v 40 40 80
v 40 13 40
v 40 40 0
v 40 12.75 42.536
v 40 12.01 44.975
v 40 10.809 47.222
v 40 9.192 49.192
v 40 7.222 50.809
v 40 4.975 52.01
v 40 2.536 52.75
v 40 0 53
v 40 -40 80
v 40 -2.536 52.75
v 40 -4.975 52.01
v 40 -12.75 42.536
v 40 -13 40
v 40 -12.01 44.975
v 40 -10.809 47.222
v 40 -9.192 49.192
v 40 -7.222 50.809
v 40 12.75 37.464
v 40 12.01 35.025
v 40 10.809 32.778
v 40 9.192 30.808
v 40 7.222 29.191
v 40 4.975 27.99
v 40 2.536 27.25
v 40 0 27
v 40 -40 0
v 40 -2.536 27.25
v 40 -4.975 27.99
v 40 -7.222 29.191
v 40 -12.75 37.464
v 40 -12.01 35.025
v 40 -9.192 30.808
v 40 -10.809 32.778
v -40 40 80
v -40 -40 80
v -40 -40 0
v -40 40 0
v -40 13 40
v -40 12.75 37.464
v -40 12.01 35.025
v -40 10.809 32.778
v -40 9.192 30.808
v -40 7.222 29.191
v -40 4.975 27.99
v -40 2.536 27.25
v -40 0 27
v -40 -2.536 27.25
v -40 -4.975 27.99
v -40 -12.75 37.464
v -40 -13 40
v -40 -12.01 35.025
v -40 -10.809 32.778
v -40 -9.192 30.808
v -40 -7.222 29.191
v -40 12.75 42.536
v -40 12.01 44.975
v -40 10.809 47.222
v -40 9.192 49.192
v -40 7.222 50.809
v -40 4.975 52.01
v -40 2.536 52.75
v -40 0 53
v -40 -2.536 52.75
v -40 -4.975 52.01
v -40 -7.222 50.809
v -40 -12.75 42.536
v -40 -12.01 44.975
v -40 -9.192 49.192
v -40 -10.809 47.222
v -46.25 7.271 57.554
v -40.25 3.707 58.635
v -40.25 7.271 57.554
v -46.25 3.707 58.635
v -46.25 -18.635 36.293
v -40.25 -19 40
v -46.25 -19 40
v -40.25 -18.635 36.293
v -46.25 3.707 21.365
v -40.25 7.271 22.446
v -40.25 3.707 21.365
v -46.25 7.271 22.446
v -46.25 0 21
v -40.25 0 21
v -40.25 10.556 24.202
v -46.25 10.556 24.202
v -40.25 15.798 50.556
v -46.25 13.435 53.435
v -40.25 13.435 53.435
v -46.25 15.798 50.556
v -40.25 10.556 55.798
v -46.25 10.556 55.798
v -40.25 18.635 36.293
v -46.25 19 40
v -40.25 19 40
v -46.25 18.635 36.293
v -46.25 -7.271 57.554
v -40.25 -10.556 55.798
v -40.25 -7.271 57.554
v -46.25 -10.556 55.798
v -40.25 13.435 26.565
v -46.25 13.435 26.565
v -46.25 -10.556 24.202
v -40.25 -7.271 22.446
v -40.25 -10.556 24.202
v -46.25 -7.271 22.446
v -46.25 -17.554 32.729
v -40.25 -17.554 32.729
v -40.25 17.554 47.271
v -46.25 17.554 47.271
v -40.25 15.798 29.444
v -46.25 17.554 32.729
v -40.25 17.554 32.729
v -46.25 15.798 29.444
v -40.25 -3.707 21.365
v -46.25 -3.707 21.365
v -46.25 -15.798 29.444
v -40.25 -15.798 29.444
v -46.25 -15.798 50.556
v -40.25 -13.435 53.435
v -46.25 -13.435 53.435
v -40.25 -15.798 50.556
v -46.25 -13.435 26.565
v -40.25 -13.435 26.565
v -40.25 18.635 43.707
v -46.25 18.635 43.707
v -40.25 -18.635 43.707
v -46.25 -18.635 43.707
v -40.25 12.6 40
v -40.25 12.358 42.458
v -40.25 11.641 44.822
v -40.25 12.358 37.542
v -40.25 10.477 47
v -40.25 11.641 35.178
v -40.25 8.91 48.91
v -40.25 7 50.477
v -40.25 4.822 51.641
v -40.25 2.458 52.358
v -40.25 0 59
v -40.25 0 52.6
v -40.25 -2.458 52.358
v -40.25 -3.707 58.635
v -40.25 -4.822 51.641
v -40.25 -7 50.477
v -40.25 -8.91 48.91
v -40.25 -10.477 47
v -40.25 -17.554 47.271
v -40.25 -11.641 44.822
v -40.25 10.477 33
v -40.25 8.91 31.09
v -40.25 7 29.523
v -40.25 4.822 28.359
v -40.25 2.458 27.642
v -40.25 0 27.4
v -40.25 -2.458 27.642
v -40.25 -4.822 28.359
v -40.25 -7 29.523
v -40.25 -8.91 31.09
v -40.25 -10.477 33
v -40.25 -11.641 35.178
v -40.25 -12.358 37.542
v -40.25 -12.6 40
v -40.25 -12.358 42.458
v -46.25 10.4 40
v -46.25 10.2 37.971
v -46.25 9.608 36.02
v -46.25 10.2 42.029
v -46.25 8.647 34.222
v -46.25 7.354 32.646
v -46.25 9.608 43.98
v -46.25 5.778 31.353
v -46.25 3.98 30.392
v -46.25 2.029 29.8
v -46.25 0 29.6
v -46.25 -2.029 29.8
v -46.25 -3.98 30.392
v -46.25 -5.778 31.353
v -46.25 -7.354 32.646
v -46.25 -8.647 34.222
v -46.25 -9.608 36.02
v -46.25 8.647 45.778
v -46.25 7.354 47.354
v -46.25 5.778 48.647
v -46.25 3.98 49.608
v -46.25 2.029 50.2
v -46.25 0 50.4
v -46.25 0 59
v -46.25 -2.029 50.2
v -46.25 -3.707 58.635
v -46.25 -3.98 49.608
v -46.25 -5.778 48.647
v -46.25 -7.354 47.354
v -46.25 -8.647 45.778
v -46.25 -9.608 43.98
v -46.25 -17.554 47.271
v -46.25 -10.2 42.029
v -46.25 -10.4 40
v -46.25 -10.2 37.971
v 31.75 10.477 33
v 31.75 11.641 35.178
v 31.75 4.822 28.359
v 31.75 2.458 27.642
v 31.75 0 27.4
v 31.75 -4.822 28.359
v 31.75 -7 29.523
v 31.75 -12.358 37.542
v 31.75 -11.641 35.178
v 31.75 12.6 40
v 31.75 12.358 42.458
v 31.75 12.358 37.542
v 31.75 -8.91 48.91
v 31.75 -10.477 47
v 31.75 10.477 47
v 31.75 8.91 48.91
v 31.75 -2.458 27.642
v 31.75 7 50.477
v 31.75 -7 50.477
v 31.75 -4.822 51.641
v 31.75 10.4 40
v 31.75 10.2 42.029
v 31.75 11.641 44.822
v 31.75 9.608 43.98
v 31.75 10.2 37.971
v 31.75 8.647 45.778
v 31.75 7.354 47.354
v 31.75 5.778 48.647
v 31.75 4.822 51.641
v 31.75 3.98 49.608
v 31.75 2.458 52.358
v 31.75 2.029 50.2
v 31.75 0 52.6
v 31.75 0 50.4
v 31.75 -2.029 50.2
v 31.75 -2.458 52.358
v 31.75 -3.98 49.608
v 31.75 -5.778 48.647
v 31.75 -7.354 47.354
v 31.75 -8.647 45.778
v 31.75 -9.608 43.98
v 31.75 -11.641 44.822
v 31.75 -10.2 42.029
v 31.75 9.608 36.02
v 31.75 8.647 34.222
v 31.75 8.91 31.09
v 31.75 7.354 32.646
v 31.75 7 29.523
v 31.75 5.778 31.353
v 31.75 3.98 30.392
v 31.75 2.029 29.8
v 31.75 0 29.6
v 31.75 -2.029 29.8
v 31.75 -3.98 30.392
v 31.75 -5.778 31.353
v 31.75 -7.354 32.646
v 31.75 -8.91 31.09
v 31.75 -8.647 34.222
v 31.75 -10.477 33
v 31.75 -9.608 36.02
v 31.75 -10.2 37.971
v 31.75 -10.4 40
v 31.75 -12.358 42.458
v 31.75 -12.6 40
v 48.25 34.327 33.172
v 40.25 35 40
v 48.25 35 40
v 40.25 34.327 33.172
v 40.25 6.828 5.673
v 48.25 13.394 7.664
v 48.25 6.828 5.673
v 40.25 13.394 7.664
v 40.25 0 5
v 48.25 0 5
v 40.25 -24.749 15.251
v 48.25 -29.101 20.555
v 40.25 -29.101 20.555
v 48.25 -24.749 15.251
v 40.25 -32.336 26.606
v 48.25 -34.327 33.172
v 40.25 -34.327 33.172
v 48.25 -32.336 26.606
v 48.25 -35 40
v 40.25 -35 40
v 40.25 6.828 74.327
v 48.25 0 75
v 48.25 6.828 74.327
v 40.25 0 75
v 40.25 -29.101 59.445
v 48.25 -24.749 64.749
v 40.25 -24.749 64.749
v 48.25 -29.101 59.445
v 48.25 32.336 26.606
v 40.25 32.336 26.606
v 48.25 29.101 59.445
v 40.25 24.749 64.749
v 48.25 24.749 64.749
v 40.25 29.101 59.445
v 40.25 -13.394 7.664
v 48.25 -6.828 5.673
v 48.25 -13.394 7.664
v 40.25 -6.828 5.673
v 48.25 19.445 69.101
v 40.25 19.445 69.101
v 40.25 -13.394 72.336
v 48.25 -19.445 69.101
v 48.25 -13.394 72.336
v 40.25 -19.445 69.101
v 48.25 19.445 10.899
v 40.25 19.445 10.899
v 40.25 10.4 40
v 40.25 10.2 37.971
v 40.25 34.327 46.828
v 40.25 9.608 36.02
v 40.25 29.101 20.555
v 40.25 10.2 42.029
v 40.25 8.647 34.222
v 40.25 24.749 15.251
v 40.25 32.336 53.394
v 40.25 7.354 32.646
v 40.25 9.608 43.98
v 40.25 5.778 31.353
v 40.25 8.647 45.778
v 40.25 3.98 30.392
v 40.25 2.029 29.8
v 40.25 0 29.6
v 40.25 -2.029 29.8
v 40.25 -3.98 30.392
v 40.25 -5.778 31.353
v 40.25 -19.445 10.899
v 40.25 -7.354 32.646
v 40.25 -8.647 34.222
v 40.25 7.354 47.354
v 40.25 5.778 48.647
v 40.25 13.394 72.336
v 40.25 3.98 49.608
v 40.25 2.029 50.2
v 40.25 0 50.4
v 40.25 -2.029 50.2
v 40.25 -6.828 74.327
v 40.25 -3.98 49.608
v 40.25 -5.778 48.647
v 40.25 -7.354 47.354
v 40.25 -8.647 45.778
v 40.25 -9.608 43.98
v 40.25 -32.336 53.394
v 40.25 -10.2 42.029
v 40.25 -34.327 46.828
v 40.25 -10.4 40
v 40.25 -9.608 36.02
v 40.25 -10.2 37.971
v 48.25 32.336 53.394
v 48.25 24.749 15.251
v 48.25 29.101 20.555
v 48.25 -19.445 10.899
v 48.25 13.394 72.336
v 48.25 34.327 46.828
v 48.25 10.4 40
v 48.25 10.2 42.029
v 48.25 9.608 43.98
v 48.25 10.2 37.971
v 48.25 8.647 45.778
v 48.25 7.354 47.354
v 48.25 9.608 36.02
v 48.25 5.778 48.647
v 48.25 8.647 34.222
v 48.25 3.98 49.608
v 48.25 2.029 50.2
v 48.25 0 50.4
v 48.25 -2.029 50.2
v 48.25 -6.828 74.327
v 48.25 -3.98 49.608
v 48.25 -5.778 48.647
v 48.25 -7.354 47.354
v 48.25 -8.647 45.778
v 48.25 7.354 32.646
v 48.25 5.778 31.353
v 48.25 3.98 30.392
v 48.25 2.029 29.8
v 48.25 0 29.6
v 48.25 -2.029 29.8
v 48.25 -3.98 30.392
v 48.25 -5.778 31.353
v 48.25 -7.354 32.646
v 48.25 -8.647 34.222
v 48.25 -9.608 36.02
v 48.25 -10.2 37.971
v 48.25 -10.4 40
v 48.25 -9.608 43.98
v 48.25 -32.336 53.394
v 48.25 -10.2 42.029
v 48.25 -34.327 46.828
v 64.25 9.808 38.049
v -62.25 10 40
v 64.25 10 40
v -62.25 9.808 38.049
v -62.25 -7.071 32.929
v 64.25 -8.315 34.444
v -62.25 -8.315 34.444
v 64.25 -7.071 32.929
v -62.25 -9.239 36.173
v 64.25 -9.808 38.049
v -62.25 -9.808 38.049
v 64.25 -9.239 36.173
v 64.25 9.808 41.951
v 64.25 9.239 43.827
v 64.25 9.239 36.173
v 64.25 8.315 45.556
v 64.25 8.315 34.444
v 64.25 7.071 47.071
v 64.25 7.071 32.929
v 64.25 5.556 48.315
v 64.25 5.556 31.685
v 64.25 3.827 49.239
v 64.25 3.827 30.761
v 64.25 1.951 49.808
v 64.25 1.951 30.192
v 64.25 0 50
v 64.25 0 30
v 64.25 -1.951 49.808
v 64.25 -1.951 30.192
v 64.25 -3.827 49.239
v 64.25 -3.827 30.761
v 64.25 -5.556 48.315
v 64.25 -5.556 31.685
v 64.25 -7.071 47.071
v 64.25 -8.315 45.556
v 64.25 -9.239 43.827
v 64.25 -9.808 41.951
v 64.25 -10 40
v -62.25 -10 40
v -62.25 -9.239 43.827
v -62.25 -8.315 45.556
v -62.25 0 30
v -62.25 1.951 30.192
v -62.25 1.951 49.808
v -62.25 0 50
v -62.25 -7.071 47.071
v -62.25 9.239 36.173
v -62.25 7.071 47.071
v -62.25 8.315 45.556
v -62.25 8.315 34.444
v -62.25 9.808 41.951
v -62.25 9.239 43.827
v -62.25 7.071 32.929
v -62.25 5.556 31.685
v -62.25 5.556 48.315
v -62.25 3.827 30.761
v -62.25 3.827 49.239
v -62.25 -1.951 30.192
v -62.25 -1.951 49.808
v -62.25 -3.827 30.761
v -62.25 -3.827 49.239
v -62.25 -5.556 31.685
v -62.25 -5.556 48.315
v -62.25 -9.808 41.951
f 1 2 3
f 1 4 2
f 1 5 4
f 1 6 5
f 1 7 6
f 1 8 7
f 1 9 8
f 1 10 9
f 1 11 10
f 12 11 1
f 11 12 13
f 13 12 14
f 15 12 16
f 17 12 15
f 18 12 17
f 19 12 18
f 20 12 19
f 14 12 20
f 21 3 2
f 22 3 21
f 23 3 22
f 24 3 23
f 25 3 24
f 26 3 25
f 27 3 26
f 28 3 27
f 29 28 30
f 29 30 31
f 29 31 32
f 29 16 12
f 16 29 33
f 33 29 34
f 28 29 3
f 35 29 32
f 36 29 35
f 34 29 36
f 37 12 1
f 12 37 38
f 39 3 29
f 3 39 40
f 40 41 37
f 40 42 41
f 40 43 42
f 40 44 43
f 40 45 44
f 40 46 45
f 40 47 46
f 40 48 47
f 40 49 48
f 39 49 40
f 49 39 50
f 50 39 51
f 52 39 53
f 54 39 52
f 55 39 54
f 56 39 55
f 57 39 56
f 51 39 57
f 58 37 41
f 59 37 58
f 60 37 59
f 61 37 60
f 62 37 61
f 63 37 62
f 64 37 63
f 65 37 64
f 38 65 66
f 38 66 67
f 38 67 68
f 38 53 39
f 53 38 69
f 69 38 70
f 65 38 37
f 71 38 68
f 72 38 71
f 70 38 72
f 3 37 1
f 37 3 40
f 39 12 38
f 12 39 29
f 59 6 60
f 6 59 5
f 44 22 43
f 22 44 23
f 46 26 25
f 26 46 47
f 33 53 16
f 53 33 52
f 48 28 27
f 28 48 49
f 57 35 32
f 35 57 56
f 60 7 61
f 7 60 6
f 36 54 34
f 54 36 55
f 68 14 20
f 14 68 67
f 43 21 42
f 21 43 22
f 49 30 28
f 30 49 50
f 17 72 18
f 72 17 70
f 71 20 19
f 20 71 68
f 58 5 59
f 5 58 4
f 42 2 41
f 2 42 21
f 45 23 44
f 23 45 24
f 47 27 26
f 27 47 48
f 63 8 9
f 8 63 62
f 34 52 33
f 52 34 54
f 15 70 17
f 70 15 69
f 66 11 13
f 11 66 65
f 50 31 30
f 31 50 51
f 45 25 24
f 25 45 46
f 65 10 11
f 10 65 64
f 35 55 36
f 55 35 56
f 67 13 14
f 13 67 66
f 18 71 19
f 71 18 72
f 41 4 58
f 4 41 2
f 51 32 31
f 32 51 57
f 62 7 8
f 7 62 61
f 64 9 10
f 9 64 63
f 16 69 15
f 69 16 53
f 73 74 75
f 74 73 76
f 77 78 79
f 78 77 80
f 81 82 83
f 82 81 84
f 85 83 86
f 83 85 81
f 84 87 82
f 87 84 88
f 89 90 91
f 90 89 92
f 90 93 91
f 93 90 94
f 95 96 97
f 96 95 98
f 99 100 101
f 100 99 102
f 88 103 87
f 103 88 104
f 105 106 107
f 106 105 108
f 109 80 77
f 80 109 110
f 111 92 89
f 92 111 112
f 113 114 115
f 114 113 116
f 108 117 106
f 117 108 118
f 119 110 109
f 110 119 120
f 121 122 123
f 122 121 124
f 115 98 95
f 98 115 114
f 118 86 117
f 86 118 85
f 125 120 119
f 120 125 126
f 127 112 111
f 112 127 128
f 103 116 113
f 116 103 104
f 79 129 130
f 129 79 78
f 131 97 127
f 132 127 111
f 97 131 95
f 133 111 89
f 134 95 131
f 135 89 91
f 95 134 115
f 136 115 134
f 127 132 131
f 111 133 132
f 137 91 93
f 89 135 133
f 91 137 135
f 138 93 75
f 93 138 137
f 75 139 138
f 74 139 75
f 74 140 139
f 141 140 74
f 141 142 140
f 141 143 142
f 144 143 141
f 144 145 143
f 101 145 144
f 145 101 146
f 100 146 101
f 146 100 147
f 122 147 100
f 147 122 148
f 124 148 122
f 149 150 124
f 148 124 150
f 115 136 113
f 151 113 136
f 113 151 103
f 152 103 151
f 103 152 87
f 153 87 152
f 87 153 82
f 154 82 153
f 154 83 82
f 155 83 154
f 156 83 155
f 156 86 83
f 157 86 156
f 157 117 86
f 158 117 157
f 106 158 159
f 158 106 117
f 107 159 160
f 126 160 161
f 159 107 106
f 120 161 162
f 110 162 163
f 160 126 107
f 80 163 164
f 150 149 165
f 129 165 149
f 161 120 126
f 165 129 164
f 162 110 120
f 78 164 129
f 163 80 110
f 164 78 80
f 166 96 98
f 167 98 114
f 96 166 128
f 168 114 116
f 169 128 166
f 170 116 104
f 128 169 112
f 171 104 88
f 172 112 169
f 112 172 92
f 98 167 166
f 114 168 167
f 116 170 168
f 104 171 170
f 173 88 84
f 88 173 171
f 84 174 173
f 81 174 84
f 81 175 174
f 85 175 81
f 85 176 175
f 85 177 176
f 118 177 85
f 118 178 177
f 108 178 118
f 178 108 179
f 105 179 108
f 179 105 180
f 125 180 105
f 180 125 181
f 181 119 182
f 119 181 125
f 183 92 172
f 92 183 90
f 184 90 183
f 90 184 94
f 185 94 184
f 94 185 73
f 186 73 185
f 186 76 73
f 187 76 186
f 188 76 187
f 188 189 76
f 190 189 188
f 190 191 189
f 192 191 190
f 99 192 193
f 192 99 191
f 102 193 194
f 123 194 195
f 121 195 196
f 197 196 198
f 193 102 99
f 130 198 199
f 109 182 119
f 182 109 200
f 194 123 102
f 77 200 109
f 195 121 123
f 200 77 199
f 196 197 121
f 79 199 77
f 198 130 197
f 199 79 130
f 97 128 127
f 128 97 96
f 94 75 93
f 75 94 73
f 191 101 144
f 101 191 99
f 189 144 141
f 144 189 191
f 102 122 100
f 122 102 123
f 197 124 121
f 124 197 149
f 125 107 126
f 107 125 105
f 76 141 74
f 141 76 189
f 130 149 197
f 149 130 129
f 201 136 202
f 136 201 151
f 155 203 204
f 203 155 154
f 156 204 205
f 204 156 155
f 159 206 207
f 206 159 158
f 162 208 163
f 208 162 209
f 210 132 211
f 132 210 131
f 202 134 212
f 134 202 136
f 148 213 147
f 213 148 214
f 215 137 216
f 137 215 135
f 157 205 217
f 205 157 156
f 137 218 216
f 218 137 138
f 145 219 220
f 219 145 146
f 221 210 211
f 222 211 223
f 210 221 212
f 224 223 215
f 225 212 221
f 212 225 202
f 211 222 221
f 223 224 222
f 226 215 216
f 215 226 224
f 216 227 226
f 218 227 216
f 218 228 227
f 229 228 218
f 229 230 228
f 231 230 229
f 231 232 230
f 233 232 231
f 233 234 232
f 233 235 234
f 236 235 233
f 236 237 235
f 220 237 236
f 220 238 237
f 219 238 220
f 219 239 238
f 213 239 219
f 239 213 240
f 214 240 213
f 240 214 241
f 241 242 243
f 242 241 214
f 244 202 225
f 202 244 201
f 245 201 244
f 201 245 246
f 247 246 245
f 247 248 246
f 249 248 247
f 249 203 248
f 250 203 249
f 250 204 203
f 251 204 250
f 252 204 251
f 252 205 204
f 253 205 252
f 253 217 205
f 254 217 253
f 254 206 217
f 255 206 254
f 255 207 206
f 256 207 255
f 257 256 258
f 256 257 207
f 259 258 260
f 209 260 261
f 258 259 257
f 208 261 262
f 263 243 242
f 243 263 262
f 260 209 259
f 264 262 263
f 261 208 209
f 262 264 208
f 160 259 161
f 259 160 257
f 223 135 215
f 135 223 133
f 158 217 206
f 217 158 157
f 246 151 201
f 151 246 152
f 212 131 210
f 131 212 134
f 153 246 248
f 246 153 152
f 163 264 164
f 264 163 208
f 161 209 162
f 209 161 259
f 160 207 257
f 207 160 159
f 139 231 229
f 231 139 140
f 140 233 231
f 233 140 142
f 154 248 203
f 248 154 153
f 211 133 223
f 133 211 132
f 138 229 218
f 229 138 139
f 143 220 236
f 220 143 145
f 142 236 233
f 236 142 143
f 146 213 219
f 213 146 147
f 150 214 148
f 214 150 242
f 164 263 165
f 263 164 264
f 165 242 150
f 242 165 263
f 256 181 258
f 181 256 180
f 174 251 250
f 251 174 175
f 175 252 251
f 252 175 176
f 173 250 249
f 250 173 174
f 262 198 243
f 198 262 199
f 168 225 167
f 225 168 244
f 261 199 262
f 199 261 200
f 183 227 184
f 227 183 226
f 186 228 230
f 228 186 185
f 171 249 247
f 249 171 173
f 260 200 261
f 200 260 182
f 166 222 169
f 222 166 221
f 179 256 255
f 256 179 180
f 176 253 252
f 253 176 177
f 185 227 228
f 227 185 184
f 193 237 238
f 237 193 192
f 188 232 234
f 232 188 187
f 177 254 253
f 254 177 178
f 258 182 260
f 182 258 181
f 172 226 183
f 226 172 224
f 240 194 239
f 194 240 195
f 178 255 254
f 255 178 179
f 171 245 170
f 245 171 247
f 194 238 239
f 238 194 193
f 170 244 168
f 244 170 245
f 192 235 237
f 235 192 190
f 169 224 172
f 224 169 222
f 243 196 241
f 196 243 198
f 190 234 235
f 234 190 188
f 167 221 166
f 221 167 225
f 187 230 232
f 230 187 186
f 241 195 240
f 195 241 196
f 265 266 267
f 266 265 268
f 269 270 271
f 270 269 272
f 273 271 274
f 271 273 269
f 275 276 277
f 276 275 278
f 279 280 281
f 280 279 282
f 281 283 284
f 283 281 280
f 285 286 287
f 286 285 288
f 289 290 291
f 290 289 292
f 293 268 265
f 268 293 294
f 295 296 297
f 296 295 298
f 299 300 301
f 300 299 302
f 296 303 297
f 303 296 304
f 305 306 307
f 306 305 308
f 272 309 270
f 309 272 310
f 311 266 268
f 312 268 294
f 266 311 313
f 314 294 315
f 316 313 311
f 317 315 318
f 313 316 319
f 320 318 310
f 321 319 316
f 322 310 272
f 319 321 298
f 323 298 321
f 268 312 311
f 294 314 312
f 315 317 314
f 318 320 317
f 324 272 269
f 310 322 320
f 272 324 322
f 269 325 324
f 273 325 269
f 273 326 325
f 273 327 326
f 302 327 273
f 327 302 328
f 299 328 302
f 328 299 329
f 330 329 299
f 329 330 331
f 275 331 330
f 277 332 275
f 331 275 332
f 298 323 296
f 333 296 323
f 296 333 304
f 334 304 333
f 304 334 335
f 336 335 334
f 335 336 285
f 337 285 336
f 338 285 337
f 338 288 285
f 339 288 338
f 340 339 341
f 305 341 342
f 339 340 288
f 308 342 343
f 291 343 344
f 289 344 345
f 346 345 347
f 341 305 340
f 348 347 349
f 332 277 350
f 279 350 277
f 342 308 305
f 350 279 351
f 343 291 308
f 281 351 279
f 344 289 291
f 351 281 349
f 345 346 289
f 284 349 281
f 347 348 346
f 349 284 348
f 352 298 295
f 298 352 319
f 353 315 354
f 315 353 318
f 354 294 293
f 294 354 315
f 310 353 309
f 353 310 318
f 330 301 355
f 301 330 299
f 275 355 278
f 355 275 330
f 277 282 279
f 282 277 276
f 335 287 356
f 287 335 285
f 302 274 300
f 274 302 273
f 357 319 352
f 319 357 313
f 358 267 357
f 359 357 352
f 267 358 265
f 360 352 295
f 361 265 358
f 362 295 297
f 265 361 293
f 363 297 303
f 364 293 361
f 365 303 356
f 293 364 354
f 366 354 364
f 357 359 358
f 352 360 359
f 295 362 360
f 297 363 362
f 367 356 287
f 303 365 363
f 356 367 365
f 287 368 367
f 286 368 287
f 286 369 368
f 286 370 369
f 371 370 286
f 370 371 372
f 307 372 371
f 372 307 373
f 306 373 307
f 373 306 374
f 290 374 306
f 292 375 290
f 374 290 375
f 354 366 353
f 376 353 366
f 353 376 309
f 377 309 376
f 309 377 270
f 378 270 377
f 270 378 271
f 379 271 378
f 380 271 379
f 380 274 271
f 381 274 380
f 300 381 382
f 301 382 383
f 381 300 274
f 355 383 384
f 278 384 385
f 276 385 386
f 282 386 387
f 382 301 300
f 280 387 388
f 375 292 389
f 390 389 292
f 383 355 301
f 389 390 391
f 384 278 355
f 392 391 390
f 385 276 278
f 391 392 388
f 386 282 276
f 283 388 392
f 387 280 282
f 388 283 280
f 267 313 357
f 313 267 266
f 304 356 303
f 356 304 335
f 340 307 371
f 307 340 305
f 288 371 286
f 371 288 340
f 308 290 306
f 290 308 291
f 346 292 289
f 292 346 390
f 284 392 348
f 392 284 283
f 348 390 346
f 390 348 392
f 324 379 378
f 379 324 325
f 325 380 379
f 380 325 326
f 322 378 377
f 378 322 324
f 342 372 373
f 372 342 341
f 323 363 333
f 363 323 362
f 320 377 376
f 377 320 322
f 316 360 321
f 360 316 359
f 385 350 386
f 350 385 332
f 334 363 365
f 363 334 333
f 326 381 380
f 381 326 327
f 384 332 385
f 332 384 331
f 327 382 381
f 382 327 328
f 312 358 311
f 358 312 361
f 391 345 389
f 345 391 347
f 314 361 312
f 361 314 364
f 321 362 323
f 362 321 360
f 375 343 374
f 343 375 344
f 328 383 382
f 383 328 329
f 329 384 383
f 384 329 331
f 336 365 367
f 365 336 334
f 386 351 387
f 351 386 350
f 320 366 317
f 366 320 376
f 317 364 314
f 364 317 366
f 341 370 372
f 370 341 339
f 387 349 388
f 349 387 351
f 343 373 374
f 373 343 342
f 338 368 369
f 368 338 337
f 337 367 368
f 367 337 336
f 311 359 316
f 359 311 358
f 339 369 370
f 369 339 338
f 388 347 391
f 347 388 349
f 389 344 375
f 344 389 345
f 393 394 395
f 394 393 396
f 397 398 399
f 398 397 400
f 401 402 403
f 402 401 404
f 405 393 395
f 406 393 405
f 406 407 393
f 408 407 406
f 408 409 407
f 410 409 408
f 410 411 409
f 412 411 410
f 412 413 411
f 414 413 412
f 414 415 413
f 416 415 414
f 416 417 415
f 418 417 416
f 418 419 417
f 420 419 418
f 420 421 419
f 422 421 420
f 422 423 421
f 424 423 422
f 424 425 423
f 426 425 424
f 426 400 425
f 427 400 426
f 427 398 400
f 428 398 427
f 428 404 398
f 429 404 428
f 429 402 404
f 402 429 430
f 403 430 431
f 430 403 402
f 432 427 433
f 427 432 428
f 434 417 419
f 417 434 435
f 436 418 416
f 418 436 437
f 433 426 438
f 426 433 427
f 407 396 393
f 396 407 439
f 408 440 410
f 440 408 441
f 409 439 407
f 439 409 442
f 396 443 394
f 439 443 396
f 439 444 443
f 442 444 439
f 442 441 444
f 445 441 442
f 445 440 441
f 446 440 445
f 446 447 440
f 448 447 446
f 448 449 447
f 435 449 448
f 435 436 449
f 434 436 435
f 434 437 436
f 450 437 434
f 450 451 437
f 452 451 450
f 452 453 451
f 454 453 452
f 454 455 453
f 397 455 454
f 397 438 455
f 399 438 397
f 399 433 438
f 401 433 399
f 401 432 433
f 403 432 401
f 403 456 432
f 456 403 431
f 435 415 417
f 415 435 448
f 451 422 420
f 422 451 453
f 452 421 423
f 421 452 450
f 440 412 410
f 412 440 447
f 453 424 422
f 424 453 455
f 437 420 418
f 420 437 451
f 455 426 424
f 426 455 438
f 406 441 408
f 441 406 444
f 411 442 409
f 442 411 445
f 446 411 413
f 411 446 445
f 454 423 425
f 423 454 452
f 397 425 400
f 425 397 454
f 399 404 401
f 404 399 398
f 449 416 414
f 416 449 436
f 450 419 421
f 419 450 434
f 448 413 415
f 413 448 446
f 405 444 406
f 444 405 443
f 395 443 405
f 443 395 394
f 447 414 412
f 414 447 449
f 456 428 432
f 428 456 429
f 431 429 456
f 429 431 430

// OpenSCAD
$fn = 32;

// ------------------------------------------------------------------------
// Bushed housing: 80 x 80 x 80 mm housing, bushing d25.2
// Every part is its own module, assembly() places them once.
// ------------------------------------------------------------------------

// --- part 1 ---
module housing() {
  difference() {
    translate([-40, -40, 0]) cube([80, 80, 80]);
    translate([0, 0, 40]) rotate([0, 90, 0]) cylinder(h = 82, d = 26, center = true);
  }
}

// --- part 2 ---
module bushing() {
  difference() {
    union() {
      cylinder(h = 6, d = 38);
      translate([0, 0, 6]) cylinder(h = 72, d = 25.2);
    }
    translate([0, 0, -1]) cylinder(h = 80, d = 20.8);
  }
}

// --- part 3 ---
module shaft() {
  translate([0, 0, -63.25]) cylinder(h = 126.5, d = 20);
}

// --- part 4 ---
module cover() {
  difference() {
    cylinder(h = 8, d = 70);
    translate([0, 0, -1]) cylinder(h = 10, d = 20.8);
  }
}

// --- assembly ---
module assembly() {
  translate([0, 0, 0]) rotate([0, 0, 0]) housing();
  translate([-46.25, 0, 40]) rotate([0, 90, 0]) bushing();
  translate([1, 0, 40]) rotate([0, 90, 0]) shaft();
  translate([40.25, 0, 40]) rotate([0, 90, 0]) cover();
}

assembly();
